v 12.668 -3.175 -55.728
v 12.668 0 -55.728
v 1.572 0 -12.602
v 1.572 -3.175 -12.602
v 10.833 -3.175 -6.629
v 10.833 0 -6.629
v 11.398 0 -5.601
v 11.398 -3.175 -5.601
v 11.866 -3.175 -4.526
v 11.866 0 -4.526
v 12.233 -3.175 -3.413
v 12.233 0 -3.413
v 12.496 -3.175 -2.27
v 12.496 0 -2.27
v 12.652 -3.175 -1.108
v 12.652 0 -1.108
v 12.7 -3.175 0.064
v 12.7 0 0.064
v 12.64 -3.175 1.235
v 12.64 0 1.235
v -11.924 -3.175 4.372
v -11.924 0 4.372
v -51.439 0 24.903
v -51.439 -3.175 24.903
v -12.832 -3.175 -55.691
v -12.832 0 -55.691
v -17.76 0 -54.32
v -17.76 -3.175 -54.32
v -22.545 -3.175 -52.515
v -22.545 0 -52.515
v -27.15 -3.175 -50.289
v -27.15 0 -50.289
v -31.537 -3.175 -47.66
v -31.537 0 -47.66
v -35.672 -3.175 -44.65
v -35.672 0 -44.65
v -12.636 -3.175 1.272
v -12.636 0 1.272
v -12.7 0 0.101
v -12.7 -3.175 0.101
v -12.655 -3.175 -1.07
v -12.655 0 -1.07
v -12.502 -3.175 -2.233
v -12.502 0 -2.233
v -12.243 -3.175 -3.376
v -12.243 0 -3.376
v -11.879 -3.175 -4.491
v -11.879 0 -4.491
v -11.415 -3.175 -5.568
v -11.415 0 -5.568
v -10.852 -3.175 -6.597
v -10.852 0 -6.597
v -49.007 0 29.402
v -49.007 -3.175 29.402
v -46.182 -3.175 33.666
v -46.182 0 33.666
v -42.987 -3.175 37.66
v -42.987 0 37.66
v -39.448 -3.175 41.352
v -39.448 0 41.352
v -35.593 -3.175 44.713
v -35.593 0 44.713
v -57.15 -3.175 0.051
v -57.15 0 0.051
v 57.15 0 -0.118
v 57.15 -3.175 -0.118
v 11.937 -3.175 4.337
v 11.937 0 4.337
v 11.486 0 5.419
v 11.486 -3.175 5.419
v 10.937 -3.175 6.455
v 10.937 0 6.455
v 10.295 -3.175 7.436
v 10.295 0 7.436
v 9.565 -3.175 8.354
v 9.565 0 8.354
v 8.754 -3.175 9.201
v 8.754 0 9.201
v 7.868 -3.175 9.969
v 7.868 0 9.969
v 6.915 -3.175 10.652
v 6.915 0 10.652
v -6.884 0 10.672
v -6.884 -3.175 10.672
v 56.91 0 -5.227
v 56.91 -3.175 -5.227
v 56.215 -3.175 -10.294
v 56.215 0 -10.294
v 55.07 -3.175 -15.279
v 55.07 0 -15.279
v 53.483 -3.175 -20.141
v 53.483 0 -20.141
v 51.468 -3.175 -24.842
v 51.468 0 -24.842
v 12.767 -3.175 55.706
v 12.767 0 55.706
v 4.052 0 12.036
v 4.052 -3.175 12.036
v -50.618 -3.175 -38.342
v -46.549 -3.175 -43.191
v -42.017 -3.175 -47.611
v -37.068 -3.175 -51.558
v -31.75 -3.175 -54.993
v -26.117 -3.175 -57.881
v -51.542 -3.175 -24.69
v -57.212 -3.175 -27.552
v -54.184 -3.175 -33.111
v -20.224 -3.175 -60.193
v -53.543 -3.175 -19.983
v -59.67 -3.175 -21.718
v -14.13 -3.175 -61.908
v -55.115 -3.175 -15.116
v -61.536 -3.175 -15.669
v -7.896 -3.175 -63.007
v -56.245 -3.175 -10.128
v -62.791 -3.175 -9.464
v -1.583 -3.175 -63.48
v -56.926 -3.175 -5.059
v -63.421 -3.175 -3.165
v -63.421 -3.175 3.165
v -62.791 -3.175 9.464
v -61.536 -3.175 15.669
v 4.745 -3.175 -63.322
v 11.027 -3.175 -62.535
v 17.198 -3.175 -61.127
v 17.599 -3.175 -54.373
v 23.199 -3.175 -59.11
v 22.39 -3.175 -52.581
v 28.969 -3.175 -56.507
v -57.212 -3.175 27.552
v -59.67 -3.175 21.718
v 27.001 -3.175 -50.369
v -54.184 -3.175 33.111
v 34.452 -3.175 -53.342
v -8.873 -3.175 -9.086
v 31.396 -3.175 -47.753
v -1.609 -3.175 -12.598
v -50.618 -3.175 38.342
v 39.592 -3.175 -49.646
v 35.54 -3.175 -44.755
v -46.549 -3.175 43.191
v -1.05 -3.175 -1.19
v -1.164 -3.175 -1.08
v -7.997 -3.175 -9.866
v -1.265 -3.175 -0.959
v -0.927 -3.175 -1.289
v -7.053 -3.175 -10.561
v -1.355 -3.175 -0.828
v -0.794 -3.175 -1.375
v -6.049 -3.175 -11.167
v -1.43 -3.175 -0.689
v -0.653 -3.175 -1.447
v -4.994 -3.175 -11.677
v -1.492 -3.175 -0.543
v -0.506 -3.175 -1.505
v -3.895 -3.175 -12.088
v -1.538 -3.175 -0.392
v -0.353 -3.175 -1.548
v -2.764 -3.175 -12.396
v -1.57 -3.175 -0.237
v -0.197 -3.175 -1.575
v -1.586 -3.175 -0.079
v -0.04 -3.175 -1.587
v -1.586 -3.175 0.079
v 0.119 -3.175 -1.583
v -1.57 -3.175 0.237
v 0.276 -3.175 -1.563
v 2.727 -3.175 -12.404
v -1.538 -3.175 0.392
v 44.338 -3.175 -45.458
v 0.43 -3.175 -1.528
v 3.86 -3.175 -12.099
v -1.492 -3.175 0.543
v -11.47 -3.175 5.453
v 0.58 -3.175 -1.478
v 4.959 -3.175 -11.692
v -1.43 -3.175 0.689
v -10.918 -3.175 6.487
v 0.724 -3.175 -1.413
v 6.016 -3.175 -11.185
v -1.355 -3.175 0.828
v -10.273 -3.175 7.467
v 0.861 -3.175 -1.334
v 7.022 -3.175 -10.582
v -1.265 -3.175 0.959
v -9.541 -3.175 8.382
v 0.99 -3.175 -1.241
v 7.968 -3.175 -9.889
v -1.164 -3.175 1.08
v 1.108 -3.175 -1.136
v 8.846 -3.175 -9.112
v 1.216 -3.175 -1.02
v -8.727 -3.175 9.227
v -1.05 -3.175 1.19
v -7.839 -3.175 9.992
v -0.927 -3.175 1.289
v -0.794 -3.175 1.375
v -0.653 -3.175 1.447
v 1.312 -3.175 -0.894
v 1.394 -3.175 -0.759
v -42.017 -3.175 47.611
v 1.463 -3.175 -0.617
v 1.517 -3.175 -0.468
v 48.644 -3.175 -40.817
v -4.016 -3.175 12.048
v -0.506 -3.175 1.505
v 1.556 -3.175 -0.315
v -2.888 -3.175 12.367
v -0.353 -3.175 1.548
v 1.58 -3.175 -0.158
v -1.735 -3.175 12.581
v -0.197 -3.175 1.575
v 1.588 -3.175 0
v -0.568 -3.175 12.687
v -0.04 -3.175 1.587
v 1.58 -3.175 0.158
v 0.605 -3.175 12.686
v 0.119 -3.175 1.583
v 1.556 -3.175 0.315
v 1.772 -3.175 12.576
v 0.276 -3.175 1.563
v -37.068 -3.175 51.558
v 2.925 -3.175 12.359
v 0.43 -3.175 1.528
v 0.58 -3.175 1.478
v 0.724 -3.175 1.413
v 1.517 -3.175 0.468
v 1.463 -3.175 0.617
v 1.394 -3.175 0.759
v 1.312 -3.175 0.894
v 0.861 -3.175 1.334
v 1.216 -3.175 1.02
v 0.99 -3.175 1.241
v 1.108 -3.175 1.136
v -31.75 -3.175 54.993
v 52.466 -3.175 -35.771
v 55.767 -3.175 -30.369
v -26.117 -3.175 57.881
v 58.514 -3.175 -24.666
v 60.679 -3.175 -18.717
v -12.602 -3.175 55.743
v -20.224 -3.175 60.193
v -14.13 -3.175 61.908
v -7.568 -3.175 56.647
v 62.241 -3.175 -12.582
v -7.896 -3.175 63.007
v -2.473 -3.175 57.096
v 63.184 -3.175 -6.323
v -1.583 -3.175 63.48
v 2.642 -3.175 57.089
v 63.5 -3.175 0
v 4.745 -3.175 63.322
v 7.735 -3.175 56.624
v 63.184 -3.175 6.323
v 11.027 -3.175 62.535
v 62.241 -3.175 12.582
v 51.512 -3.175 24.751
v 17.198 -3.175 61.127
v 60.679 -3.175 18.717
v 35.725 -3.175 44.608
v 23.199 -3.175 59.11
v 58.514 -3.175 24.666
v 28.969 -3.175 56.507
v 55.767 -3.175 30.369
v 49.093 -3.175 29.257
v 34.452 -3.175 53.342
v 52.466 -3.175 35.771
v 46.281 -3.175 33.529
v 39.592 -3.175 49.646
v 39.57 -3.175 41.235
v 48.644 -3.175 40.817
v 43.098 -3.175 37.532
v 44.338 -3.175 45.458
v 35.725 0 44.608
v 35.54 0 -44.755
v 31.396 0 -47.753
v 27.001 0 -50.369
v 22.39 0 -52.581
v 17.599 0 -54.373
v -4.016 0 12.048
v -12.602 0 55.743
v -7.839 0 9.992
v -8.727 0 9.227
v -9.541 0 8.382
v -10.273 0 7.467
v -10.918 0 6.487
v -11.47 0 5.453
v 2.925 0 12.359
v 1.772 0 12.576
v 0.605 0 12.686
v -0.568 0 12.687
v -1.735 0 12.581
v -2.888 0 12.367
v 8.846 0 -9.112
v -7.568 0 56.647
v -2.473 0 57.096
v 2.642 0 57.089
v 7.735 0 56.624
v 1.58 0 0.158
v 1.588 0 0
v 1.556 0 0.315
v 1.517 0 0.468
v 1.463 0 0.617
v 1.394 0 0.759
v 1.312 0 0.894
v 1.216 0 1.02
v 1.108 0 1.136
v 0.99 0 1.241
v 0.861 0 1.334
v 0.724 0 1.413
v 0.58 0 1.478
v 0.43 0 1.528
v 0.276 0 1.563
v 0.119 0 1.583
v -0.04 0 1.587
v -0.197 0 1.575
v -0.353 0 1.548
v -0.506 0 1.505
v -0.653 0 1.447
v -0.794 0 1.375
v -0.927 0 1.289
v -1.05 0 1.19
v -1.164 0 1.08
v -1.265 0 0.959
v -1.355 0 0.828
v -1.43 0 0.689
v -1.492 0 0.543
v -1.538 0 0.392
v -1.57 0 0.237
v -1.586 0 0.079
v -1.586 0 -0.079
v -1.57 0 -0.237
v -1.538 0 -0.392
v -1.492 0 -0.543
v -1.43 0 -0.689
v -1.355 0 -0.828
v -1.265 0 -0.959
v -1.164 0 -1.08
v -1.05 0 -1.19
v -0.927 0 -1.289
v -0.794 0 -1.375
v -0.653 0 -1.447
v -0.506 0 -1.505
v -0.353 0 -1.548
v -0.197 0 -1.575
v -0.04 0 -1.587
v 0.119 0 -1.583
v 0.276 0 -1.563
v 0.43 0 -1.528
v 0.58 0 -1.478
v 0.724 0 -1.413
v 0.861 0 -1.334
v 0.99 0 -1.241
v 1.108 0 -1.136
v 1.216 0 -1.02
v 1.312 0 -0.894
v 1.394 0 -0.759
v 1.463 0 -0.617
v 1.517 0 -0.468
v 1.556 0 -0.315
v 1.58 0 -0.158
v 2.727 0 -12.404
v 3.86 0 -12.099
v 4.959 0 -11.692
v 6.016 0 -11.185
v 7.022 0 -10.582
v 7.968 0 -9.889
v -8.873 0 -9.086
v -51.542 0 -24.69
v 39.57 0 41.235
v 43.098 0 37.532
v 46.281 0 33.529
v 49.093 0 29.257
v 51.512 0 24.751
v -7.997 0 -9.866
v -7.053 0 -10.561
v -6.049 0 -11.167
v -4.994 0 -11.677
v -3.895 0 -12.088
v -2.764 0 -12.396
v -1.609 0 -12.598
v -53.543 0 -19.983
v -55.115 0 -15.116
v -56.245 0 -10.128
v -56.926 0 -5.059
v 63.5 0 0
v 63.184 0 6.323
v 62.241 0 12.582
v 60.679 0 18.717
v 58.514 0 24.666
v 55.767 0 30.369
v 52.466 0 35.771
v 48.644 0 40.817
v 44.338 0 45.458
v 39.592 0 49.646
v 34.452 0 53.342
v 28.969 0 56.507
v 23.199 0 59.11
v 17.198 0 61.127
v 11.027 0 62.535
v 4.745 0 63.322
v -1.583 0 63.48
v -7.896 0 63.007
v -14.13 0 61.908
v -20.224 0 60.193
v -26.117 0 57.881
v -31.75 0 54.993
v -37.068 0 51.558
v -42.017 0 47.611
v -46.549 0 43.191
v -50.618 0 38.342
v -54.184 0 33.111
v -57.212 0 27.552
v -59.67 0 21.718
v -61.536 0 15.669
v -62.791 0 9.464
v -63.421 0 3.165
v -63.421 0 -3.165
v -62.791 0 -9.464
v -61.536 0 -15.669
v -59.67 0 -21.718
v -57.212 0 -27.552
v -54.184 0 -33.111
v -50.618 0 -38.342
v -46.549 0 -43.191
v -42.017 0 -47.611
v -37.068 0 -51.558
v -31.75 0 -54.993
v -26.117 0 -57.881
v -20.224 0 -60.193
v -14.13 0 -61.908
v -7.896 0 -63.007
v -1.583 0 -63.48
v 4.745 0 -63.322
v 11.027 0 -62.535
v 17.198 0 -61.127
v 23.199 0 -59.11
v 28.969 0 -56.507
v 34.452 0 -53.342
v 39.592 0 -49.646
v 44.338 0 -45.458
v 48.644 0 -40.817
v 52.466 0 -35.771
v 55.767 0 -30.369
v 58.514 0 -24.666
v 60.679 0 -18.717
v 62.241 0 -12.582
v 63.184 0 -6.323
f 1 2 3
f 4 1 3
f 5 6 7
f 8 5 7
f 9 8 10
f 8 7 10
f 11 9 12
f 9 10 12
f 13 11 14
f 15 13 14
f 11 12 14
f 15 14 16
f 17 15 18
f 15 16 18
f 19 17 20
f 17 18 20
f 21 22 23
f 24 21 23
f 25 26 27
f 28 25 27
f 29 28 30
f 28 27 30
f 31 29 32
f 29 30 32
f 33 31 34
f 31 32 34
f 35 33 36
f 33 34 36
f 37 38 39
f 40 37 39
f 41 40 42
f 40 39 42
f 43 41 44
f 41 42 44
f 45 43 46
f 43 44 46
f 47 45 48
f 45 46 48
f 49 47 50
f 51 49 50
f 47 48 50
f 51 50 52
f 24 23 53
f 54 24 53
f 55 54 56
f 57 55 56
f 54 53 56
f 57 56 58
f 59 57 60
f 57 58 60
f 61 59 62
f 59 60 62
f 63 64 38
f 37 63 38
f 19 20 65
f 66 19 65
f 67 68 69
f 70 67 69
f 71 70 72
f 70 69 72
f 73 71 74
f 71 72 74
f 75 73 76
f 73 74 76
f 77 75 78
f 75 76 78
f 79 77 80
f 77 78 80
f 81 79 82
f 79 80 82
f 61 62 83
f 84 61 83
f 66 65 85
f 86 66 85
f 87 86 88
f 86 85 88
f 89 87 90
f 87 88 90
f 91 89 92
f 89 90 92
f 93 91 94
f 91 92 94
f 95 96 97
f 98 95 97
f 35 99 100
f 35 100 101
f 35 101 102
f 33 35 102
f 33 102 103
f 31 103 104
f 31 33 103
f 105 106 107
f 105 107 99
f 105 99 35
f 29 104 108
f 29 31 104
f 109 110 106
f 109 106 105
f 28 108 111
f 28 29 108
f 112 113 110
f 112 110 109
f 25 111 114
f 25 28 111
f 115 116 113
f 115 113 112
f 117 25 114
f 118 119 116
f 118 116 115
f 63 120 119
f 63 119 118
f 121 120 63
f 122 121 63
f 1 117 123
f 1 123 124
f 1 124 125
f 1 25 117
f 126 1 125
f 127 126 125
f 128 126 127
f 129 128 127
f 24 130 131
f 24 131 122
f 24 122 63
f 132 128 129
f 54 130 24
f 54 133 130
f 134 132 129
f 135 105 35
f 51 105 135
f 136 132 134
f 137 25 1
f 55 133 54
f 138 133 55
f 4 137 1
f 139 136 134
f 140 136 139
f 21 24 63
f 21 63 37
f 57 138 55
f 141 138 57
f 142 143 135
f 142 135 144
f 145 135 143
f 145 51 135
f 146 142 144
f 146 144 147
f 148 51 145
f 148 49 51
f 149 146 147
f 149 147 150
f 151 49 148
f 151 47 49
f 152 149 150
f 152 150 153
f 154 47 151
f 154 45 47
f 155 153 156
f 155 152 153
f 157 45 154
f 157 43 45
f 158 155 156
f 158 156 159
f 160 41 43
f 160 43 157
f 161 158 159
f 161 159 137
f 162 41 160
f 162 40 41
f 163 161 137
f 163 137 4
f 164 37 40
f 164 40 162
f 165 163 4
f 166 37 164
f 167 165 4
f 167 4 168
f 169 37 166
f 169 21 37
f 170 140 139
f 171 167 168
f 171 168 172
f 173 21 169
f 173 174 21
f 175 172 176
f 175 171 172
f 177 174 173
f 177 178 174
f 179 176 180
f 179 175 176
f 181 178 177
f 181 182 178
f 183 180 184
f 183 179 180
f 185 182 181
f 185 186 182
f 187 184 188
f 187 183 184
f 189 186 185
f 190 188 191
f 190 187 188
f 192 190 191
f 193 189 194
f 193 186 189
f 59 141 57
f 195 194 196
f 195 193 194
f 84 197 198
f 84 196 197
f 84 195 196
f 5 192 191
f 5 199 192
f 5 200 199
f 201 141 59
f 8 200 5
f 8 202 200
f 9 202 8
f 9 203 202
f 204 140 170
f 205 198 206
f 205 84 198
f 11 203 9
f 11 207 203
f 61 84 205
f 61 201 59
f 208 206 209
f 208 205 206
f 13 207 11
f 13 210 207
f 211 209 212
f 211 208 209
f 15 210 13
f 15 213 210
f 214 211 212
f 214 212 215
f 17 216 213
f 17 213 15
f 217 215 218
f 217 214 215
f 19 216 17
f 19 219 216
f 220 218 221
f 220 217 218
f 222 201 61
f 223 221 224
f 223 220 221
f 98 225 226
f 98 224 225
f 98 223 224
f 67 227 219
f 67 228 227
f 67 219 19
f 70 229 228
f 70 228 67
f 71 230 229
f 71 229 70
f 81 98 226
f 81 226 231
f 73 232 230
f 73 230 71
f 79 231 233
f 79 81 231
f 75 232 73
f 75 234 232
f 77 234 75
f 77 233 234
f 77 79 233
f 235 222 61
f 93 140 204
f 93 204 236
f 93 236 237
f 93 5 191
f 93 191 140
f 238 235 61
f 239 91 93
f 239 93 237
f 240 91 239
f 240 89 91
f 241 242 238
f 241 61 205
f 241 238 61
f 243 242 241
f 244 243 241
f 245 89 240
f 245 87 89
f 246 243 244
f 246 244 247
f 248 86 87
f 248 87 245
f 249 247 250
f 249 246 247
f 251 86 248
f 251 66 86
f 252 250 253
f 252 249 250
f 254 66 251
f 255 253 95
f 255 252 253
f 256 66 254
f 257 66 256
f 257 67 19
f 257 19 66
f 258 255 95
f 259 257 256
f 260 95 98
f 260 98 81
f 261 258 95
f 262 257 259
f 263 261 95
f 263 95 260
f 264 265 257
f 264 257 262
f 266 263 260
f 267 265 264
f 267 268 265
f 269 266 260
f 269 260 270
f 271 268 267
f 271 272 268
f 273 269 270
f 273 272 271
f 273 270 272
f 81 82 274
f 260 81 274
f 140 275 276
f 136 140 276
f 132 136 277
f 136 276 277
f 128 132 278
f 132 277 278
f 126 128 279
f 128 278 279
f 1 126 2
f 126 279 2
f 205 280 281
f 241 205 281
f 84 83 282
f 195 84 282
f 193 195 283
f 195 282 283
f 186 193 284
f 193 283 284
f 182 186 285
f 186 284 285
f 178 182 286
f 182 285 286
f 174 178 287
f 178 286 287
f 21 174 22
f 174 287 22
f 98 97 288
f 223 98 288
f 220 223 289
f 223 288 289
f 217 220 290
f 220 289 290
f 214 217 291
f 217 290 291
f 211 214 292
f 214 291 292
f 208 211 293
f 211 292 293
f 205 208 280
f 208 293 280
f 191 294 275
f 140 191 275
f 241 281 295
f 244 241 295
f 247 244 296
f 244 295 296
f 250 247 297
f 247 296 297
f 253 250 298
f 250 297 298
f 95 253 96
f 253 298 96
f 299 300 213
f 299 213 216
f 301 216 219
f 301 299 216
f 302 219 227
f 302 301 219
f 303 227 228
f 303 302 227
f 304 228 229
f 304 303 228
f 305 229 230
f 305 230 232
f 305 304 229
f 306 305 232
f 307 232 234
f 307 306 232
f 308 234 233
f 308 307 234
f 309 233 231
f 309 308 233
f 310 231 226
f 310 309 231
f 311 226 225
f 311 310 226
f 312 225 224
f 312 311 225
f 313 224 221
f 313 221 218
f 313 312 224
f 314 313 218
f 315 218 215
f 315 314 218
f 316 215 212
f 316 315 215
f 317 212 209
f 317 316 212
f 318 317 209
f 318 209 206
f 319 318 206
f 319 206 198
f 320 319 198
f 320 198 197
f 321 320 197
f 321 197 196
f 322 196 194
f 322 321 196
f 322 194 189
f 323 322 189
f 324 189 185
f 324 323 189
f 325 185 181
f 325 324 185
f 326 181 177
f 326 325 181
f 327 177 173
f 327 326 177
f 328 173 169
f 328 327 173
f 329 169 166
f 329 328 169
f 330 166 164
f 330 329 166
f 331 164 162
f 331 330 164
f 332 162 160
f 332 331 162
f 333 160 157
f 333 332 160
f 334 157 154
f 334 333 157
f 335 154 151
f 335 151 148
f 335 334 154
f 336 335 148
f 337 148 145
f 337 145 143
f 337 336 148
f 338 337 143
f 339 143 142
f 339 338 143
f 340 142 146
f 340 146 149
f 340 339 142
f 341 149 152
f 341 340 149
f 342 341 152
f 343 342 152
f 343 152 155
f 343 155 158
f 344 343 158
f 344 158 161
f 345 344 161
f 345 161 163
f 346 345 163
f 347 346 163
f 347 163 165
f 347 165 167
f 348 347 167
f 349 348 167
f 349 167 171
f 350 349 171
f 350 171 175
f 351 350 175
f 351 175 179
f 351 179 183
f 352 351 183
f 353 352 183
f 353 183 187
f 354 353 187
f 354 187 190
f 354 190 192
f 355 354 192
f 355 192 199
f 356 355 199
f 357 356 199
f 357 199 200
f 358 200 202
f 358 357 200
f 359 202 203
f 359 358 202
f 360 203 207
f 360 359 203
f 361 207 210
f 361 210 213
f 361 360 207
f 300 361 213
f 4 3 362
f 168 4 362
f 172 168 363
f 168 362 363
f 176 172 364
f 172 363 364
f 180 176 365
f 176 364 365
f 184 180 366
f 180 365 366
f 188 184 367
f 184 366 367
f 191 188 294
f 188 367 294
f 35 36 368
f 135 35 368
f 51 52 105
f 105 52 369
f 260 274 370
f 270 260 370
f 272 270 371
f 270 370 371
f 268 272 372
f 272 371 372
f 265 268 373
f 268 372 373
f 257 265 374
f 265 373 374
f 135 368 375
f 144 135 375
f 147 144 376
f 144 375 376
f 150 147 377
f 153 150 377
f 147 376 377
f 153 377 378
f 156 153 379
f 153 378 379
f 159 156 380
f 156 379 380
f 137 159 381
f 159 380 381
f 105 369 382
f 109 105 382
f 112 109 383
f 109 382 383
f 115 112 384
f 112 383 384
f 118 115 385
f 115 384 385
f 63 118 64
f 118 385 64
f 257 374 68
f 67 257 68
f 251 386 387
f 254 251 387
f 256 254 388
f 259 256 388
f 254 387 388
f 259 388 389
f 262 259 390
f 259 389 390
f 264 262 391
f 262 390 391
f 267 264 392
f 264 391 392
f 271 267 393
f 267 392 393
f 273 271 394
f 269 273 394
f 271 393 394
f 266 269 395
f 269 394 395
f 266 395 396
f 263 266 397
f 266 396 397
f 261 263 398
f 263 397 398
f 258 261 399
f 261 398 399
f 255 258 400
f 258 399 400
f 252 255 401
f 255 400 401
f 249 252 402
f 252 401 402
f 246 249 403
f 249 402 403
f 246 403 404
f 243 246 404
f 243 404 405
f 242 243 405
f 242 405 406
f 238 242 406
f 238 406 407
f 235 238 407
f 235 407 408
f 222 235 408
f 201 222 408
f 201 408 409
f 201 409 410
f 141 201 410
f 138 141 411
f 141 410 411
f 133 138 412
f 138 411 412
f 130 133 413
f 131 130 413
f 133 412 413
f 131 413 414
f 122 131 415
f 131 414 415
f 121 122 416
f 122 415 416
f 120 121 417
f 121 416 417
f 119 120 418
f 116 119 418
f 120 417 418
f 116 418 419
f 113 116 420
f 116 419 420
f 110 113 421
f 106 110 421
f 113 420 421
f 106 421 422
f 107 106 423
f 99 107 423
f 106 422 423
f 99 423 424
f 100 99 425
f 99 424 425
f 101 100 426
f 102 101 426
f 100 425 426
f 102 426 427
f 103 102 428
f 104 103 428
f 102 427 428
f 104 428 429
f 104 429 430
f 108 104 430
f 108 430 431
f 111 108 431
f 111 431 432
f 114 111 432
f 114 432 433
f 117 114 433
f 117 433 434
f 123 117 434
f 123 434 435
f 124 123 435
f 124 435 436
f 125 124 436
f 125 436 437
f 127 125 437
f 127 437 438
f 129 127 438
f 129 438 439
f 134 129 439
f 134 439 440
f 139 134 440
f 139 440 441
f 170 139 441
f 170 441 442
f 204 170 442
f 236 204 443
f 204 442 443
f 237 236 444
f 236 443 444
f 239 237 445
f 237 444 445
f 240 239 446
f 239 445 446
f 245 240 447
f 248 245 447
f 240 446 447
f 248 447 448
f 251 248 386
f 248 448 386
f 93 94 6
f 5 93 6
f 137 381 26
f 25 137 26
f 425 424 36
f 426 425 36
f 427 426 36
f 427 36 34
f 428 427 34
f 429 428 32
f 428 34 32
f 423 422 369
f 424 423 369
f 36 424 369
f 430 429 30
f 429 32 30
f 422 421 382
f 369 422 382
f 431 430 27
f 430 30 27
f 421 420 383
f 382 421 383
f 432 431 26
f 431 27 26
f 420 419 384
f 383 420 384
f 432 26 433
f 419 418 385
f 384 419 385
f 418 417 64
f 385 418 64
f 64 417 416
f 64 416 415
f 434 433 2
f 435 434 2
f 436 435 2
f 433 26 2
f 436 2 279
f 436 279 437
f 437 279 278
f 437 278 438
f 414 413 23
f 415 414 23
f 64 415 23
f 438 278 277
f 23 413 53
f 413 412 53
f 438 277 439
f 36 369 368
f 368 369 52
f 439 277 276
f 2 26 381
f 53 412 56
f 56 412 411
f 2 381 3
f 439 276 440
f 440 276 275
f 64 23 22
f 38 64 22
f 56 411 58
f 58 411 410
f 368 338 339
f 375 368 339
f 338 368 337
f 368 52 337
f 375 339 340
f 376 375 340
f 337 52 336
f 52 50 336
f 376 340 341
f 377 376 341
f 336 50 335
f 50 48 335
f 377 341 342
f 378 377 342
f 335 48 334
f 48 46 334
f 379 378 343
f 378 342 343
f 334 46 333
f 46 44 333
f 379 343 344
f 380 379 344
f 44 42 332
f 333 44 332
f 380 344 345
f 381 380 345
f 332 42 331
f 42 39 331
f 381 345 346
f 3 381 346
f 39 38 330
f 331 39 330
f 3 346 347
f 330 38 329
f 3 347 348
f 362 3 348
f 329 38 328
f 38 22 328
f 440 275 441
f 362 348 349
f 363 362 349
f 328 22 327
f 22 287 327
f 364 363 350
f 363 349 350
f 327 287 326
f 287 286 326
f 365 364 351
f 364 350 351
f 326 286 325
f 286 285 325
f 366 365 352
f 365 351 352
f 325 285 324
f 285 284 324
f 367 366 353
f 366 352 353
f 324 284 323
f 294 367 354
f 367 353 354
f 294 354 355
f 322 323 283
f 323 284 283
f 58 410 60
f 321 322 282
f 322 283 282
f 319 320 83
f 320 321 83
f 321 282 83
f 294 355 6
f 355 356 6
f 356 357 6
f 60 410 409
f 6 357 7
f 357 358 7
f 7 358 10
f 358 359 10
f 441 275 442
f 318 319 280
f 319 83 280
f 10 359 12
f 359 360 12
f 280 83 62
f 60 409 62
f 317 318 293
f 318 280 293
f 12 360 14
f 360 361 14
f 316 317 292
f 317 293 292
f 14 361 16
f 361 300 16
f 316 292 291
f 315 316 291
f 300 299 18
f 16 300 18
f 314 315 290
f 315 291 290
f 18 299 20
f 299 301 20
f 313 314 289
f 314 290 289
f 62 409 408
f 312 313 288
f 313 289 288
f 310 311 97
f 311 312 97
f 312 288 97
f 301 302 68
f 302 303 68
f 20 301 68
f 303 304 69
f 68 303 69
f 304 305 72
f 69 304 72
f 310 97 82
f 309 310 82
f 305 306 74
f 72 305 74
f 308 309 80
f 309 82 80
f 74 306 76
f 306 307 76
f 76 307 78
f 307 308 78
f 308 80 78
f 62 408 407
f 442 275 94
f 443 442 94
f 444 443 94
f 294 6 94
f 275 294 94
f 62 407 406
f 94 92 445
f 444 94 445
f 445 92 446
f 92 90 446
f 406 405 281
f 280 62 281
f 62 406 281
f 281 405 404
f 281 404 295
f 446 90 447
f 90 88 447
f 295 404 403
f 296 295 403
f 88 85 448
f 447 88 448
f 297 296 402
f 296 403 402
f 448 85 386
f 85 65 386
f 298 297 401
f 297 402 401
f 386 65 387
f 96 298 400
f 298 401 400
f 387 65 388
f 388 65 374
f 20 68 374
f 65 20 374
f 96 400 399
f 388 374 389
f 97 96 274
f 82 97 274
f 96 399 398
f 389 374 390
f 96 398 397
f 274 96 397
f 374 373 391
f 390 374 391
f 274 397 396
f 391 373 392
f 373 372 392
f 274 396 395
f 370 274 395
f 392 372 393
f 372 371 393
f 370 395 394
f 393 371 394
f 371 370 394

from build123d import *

# Parameters (mm, degrees)
F0_R     = 63.5
F0_R_2   = 1.5875
F1_DEPTH = 3.175


with BuildPart() as f1:
    # F0 (on Front) → F1 (new body)
    with BuildSketch(Plane.XZ):
        Circle(F0_R)
        with BuildLine():
            ThreePointArc((-12.832221, -55.690723), (-24.872502, -51.45368), (-35.672091, -44.650021))
            Line((-35.672091, -44.650021), (-8.873024, -9.086223))
            ThreePointArc((-8.873024, -9.086223), (-5.527223, -11.434151), (-1.608887, -12.597678))
            Line((-1.608887, -12.597678), (-12.832221, -55.690723))
        make_face(mode=Mode.SUBTRACT)
        with BuildLine():
            ThreePointArc((-51.541519, -24.689963), (-55.735858, -12.634739), (-57.149977, 0.050731))
            Line((-57.149977, 0.050731), (-12.636135, 1.272042))
            ThreePointArc((-12.636135, 1.272042), (-12.385746, -2.80772), (-10.852385, -6.596645))
            Line((-10.852385, -6.596645), (-51.541519, -24.689963))
        make_face(mode=Mode.SUBTRACT)
        with BuildLine():
            ThreePointArc((35.540001, -44.755232), (24.720355, -51.52695), (12.667607, -55.728397))
            Line((12.667607, -55.728397), (1.571655, -12.602377))
            ThreePointArc((1.571655, -12.602377), (5.493412, -11.450433), (8.846137, -9.112402))
            Line((8.846137, -9.112402), (35.540001, -44.755232))
        make_face(mode=Mode.SUBTRACT)
        with BuildLine():
            ThreePointArc((57.149878, -0.118139), (55.698281, -12.799376), (51.468339, -24.842153))
            Line((51.468339, -24.842153), (10.832846, -6.628684))
            ThreePointArc((10.832846, -6.628684), (12.377396, -2.844306), (12.639839, 1.234699))
            Line((12.639839, 1.234699), (57.149878, -0.118139))
        make_face(mode=Mode.SUBTRACT)
        with BuildLine():
            ThreePointArc((-51.439002, 24.902842), (-44.628976, 35.698417), (-35.592765, 44.713282))
            Line((-35.592765, 44.713282), (-6.883979, 10.672433))
            ThreePointArc((-6.883979, 10.672433), (-9.91755, 7.932982), (-11.923817, 4.371795))
            Line((-11.923817, 4.371795), (-51.439002, 24.902842))
        make_face(mode=Mode.SUBTRACT)
        Circle(F0_R_2, mode=Mode.SUBTRACT)
        with BuildLine():
            ThreePointArc((35.724731, 44.607915), (44.734265, 35.566389), (51.512362, 24.750739))
            Line((51.512362, 24.750739), (11.936683, 4.336543))
            ThreePointArc((11.936683, 4.336543), (9.940948, 7.903642), (6.915484, 10.652046))
            Line((6.915484, 10.652046), (35.724731, 44.607915))
        make_face(mode=Mode.SUBTRACT)
        with BuildLine():
            ThreePointArc((-12.601867, 55.7433), (0.084435, 57.149938), (12.766526, 55.705819))
            Line((12.766526, 55.705819), (4.051954, 12.036265))
            ThreePointArc((4.051954, 12.036265), (0.018763, 12.699986), (-4.016371, 12.048185))
            Line((-4.016371, 12.048185), (-12.601867, 55.7433))
        make_face(mode=Mode.SUBTRACT)
    extrude(amount=F1_DEPTH)


solid = f1.part
